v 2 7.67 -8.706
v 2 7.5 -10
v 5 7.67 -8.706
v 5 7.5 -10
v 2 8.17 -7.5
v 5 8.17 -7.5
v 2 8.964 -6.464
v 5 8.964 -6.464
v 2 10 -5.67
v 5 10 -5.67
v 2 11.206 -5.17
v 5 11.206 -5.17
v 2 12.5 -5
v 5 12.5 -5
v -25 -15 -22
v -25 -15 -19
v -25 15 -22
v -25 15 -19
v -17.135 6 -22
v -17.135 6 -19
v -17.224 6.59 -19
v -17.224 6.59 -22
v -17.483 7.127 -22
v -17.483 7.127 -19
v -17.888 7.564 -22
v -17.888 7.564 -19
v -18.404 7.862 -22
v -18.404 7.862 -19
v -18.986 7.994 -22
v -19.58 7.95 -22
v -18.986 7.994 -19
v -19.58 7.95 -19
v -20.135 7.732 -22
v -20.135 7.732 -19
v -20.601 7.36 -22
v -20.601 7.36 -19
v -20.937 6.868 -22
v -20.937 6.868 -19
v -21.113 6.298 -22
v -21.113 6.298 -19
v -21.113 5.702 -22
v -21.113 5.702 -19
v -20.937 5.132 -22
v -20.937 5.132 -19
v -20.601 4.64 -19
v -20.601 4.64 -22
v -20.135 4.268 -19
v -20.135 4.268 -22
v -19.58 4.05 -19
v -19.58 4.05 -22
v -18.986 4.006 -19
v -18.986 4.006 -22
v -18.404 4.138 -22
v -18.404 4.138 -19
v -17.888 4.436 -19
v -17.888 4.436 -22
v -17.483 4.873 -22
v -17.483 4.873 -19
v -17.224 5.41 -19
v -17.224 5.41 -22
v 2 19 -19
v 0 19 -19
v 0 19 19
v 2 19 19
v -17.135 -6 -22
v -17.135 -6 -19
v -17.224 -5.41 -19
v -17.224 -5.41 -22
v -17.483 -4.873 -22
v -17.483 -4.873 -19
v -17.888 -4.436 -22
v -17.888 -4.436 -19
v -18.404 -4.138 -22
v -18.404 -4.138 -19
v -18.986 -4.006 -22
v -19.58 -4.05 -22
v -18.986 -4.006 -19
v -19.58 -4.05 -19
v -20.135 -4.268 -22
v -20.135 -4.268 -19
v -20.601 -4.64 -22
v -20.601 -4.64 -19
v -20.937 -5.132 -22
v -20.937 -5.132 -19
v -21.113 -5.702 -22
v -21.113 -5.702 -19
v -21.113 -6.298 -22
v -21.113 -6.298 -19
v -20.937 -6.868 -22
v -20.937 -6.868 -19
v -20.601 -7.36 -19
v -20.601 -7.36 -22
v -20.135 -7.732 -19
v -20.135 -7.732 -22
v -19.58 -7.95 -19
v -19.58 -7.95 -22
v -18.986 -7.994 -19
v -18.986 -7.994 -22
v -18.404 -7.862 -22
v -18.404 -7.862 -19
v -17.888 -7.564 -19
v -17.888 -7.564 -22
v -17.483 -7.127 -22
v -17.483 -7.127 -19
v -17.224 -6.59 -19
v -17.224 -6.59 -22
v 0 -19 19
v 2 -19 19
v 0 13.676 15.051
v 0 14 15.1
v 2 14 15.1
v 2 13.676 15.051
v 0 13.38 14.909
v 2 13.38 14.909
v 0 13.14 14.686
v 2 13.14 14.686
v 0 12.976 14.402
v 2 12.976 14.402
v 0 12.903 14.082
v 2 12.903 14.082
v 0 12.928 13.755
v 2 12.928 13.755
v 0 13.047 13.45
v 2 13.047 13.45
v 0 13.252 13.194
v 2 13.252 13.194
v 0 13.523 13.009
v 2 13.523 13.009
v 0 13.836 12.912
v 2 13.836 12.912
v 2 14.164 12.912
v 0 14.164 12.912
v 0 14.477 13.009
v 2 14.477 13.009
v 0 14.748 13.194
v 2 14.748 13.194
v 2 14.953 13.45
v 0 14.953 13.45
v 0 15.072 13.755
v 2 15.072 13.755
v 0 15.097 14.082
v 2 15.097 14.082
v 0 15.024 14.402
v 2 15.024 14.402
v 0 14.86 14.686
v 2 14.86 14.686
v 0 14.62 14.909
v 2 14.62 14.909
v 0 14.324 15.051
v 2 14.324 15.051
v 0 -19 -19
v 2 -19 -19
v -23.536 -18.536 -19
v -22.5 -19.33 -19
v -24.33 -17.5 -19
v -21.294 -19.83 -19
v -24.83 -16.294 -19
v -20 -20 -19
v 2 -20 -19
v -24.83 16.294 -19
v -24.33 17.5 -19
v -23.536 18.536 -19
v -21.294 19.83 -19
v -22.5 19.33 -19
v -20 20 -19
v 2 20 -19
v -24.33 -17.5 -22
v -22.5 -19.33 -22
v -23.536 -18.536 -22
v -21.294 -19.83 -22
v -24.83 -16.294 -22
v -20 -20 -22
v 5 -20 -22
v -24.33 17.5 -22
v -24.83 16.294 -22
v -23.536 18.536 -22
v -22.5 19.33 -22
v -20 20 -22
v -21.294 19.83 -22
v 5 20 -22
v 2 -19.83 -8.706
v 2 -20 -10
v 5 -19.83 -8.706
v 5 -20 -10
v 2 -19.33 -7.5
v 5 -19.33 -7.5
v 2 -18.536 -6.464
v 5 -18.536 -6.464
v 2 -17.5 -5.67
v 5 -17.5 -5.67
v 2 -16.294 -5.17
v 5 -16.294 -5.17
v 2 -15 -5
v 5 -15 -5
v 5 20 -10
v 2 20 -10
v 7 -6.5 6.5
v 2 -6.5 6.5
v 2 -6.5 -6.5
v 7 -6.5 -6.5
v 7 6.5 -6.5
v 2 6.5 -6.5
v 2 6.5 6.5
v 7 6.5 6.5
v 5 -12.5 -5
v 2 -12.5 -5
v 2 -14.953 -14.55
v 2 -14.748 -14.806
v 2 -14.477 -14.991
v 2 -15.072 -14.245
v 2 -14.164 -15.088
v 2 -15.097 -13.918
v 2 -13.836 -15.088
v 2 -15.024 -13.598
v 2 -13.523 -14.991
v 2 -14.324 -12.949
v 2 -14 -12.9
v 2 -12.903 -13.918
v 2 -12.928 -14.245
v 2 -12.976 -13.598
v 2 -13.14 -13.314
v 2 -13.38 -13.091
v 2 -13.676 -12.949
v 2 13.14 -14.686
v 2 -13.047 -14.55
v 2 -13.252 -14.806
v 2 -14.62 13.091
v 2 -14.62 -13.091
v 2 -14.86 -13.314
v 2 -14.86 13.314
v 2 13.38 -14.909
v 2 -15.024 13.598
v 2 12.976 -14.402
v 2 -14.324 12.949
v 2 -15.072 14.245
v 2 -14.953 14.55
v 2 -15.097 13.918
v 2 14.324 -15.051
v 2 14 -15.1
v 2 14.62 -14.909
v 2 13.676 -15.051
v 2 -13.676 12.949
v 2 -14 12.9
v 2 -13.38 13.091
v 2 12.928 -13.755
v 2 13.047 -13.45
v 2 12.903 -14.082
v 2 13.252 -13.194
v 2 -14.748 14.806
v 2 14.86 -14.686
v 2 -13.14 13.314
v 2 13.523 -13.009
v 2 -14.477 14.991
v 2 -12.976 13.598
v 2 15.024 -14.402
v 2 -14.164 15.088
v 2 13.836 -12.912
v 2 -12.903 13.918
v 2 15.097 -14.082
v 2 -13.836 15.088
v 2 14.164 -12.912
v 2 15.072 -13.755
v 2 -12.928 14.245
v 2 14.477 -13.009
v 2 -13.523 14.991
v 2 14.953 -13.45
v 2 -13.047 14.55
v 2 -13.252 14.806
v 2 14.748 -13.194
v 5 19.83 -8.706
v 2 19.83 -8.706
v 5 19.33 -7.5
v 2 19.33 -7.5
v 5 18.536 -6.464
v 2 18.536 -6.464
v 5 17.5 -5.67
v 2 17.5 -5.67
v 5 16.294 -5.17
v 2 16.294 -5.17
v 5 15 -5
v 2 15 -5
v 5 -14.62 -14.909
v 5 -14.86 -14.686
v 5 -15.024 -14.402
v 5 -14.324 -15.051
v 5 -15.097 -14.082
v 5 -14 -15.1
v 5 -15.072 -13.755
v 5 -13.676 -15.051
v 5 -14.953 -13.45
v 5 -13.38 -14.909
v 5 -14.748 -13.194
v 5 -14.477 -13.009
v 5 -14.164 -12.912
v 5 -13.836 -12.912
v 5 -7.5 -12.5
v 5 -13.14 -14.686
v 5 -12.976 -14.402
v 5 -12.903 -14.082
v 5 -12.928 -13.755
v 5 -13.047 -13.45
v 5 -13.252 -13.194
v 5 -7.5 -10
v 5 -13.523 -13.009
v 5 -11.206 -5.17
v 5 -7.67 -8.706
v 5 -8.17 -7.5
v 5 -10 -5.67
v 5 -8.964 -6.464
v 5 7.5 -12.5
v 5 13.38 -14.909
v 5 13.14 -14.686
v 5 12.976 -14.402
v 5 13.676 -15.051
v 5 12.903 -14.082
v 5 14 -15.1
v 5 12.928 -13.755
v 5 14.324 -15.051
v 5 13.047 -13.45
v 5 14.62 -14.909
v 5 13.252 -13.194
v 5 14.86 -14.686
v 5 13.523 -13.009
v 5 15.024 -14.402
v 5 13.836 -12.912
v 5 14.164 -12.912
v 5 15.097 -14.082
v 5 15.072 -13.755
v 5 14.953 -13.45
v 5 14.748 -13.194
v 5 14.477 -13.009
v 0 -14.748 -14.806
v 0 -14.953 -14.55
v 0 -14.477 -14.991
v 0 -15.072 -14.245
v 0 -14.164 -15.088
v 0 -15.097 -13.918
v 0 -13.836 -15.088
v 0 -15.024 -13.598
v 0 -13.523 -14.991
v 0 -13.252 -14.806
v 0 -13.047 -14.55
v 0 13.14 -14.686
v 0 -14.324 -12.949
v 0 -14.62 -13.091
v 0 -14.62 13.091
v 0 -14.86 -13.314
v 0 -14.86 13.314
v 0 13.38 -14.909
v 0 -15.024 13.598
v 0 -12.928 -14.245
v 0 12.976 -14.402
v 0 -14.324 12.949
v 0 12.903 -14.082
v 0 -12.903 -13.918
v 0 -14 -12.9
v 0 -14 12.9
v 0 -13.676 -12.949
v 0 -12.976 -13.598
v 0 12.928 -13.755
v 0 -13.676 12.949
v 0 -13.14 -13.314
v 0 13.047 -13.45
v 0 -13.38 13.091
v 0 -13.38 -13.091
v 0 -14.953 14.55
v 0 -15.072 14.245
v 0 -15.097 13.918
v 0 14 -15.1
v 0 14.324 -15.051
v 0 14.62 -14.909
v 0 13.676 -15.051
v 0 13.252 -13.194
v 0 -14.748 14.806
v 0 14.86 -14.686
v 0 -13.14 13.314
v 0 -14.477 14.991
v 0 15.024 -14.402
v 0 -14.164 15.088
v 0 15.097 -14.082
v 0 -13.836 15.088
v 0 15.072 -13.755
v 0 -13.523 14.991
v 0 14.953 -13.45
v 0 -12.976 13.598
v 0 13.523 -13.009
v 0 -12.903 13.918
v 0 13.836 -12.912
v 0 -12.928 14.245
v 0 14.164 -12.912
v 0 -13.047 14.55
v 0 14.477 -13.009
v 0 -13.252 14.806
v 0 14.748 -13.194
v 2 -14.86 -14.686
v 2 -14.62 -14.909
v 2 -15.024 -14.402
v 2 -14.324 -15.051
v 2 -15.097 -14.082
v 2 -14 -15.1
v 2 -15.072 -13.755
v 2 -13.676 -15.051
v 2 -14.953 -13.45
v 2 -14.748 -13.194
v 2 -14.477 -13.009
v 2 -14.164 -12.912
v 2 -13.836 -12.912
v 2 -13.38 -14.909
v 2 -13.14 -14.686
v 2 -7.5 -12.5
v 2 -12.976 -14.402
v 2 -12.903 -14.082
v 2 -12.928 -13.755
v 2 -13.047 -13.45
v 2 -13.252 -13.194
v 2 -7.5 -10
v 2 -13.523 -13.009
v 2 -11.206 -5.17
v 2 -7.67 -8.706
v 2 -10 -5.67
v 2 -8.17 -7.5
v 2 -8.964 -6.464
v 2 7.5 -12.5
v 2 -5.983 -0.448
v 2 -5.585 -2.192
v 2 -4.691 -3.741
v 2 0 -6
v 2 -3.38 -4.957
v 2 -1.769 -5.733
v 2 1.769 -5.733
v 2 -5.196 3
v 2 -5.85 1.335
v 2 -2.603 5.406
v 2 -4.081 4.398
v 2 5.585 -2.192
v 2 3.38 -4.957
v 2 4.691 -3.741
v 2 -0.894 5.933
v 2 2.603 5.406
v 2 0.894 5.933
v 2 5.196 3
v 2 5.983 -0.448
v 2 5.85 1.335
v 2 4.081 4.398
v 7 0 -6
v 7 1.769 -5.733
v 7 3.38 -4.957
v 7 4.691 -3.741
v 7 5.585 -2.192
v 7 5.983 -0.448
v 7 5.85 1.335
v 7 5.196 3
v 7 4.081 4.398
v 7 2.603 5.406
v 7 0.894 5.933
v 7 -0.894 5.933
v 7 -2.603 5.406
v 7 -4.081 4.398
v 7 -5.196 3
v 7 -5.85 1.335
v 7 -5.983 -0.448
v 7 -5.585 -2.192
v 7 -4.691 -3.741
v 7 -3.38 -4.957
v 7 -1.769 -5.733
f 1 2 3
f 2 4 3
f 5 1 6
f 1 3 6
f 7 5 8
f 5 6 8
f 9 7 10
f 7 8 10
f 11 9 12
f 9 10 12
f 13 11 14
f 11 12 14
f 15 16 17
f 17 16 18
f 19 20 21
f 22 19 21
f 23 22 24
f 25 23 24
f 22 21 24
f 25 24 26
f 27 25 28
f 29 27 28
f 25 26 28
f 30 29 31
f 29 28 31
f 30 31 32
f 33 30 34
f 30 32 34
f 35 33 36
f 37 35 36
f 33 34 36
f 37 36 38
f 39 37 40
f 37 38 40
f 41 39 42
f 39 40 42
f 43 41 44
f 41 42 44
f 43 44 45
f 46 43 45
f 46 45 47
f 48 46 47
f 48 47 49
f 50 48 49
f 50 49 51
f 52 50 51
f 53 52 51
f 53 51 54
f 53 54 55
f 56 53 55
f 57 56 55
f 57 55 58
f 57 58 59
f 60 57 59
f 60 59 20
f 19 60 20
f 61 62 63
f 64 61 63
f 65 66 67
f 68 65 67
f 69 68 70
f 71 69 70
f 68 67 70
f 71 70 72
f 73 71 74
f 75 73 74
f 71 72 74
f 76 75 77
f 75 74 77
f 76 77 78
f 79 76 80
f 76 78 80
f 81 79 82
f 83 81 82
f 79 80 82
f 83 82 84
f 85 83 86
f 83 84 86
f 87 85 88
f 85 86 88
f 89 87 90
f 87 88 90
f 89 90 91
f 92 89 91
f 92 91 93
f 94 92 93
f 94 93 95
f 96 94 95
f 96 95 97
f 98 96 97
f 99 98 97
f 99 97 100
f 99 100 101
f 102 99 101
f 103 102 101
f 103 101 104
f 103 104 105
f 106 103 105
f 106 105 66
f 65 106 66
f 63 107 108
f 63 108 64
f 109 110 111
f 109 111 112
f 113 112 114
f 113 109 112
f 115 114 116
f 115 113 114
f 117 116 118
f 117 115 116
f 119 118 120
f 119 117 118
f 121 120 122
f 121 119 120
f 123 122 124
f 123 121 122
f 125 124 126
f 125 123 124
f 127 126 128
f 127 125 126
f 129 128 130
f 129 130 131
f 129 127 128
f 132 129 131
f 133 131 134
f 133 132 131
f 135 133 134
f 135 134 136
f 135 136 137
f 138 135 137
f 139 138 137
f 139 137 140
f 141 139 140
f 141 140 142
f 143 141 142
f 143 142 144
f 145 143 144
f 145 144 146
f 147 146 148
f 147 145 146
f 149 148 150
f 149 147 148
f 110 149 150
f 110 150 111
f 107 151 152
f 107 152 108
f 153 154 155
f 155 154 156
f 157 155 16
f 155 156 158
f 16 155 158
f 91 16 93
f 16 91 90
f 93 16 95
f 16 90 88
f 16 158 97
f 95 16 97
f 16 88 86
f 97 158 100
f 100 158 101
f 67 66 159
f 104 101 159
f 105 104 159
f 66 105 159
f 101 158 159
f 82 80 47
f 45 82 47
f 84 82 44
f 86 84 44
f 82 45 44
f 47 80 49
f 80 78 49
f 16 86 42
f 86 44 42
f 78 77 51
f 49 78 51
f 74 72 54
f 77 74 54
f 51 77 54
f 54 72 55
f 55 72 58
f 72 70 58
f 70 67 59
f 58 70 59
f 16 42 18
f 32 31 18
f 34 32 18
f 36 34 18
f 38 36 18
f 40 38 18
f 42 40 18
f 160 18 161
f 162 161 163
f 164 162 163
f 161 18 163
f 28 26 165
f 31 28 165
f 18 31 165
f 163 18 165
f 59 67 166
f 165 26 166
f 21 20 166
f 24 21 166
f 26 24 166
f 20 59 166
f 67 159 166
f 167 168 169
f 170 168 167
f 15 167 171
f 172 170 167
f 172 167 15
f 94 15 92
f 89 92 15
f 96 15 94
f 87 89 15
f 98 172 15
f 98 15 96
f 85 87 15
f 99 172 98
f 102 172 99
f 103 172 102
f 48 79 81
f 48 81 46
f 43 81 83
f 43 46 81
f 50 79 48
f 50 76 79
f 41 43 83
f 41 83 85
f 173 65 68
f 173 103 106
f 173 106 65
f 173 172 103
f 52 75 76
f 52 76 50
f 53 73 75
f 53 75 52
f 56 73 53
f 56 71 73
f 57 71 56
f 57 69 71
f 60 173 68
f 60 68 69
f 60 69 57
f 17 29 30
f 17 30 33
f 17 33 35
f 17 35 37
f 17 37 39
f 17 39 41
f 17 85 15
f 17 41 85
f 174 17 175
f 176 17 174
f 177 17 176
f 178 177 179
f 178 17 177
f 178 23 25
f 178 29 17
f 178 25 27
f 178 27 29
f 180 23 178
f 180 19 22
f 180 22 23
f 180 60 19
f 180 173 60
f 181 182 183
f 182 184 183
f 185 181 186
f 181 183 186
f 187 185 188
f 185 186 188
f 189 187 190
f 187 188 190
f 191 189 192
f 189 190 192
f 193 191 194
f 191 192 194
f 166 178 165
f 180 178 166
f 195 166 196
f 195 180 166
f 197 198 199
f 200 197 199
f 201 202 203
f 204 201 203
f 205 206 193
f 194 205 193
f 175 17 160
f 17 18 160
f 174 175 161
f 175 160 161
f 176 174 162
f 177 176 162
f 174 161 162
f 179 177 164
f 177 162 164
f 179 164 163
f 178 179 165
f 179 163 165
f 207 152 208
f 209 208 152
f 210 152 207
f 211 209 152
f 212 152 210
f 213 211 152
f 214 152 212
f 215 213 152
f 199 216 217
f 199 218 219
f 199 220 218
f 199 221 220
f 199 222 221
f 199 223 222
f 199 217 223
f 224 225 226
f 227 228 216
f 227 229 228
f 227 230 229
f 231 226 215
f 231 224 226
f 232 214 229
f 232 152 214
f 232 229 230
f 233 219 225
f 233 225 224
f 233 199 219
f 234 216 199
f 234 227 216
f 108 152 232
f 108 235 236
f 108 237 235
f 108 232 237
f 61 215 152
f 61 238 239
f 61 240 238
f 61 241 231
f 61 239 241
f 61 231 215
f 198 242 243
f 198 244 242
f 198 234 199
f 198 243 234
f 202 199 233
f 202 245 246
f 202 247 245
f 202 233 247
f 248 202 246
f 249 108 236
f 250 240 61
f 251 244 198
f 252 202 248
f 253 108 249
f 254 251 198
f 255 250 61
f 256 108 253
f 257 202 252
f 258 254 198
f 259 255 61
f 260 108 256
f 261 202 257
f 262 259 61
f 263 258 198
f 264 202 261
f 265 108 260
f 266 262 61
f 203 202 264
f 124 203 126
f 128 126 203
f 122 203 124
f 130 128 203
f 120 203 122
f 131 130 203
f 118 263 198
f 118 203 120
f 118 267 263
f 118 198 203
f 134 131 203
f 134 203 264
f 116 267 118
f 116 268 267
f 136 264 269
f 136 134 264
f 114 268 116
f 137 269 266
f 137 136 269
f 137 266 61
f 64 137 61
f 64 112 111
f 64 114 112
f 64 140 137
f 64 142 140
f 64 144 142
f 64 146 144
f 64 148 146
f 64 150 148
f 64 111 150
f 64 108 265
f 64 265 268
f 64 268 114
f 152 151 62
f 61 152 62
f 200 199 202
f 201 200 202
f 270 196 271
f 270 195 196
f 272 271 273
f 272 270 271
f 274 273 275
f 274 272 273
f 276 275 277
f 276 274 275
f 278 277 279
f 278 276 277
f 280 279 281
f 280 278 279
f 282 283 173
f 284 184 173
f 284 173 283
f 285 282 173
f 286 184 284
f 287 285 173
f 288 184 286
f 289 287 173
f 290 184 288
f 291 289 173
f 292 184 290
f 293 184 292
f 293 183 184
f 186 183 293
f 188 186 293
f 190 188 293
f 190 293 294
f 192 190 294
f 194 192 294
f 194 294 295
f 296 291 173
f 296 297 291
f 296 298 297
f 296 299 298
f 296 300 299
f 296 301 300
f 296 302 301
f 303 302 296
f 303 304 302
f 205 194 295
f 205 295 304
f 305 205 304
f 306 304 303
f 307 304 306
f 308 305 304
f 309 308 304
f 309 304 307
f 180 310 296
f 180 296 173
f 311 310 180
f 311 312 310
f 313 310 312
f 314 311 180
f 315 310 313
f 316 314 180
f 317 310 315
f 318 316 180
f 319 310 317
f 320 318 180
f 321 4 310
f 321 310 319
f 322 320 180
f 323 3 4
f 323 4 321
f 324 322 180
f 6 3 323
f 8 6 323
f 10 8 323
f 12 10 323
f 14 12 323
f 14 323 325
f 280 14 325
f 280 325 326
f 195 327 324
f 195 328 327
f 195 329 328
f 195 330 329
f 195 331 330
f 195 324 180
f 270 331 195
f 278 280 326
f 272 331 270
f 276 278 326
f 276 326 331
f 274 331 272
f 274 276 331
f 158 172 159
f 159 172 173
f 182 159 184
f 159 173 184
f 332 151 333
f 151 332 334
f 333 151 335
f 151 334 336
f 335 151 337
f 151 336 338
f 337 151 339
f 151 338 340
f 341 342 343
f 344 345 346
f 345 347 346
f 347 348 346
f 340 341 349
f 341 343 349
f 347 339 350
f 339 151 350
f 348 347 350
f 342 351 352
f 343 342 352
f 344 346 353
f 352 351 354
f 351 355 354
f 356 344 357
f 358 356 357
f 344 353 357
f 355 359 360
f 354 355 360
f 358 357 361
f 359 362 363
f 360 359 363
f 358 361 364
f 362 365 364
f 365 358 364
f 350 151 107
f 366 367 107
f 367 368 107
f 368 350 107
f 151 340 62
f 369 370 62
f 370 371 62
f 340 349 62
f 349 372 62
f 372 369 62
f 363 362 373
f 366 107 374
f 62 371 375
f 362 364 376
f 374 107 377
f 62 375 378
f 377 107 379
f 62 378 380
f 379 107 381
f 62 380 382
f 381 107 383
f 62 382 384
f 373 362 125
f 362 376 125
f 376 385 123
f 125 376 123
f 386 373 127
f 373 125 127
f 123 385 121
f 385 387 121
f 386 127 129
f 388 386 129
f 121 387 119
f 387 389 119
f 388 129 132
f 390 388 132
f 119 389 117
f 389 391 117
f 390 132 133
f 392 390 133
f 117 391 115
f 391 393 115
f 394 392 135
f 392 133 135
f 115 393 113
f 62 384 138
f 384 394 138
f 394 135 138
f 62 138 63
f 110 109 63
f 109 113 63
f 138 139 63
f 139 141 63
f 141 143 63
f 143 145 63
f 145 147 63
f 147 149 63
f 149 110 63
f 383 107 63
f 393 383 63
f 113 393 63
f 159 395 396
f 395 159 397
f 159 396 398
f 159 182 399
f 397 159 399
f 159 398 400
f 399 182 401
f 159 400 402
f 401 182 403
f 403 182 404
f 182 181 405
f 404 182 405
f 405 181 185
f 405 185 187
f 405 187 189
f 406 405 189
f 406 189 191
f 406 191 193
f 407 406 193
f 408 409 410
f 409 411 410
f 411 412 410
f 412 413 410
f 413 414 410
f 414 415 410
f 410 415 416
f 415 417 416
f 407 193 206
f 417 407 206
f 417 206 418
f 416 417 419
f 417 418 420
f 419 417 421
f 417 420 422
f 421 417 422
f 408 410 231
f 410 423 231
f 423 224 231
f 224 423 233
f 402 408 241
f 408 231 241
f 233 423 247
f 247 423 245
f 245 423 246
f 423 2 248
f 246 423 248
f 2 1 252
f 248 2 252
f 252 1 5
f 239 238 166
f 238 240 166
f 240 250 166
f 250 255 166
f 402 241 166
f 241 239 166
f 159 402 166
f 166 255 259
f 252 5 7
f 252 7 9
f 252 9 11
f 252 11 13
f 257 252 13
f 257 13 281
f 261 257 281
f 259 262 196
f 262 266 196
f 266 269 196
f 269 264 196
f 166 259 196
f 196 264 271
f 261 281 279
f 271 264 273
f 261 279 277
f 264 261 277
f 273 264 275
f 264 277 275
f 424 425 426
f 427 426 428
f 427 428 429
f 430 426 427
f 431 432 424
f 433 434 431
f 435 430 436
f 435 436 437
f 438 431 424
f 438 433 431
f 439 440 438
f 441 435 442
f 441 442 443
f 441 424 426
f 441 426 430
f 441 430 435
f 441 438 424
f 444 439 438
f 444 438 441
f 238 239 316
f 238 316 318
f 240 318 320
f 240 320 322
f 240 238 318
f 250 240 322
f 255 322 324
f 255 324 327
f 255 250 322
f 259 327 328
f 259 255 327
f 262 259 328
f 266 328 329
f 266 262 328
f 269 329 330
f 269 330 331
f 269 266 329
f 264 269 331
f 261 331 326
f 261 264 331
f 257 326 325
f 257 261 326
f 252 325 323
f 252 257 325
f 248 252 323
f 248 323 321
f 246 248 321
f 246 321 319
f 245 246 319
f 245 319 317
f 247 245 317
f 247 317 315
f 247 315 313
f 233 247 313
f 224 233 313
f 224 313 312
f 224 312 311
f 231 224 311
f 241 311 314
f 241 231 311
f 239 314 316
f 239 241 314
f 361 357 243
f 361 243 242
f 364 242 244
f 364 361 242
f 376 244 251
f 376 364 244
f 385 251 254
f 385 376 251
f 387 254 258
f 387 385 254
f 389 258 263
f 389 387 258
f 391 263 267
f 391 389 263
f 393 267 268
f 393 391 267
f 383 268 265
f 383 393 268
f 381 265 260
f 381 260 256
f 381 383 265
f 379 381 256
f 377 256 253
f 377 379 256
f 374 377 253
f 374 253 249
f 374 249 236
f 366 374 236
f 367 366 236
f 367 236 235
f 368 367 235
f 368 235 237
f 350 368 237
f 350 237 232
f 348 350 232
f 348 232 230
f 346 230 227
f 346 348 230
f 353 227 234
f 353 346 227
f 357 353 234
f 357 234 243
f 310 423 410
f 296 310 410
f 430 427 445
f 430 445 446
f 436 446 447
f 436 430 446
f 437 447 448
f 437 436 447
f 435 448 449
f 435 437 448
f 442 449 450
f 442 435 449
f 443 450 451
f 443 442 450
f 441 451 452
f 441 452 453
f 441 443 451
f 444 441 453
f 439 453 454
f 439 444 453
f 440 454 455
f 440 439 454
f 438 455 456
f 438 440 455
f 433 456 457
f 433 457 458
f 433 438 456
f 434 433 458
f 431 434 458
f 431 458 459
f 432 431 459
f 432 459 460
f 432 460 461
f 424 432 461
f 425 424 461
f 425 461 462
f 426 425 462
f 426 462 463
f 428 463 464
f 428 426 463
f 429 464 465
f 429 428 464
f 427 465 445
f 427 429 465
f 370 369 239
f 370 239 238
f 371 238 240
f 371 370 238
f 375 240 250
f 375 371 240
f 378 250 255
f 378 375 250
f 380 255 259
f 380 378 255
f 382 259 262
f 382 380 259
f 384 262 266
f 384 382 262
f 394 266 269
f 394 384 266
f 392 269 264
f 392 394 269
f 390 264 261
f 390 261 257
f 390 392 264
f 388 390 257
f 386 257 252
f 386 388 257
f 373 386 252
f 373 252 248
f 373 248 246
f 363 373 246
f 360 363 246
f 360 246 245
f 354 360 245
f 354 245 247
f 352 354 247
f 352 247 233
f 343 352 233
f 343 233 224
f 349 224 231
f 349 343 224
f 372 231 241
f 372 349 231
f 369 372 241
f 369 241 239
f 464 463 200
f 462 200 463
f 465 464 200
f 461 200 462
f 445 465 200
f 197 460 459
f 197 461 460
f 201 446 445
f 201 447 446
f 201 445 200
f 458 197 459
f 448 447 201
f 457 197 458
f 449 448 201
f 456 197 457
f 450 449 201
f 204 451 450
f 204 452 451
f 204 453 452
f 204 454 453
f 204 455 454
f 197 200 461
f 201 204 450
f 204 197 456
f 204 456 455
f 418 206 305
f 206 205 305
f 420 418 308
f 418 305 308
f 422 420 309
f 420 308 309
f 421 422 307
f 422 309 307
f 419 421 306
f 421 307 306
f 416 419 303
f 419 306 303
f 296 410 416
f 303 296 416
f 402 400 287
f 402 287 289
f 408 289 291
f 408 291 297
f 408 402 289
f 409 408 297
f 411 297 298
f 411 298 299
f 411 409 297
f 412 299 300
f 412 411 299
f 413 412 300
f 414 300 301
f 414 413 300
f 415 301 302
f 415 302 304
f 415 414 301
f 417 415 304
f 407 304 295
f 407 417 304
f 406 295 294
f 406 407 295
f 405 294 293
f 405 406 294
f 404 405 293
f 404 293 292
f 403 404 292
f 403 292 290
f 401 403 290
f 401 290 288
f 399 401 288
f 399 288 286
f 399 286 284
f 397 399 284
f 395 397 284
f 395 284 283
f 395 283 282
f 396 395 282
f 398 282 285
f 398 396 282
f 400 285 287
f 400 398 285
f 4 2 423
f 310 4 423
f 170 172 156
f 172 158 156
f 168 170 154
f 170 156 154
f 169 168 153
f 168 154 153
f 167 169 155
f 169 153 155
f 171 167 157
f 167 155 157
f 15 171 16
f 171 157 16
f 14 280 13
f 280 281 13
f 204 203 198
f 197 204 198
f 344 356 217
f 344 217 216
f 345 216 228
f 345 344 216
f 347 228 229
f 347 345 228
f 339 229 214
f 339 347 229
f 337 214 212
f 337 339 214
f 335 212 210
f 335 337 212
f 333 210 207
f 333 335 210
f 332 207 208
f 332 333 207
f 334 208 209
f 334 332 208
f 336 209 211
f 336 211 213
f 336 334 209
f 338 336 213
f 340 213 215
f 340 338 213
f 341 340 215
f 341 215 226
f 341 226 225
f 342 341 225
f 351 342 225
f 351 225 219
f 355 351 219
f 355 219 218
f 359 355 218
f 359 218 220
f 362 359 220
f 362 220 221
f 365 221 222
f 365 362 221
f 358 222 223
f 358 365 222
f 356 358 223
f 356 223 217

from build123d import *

# Parameters (mm, degrees)
SKETCH1_W           = 38
SKETCH1_H           = 38
SKETCH1_R           = 1.1
BOSS_EXTRUDE1_DEPTH = 2
SKETCH2_R           = 6.5
SKETCH2_R_2         = 6
BOSS_EXTRUDE2_DEPTH = 5
SKETCH3_R           = 1.1
BOSS_EXTRUDE3_DEPTH = 3
SKETCH4_W           = 40
SKETCH4_H           = 3
BOSS_EXTRUDE4_DEPTH = 30
SKETCH5_R           = 2
CUT_EXTRUDE1_DEPTH  = 10
FILLET1_R           = 5


with BuildPart() as part:
    # Sketch1 → Boss-Extrude1 (new body)
    with BuildSketch(Plane.YZ):
        Rectangle(SKETCH1_W, SKETCH1_H)
        with Locations(Location((-14, 14, 0), (0, 0, 270))):
            Circle(SKETCH1_R, mode=Mode.SUBTRACT)
        with Locations(Location((-14, -14, 0), (0, 0, 90))):
            Circle(SKETCH1_R, mode=Mode.SUBTRACT)
        with Locations(Location((14, -14, 0), (0, 0, 270))):
            Circle(SKETCH1_R, mode=Mode.SUBTRACT)
        with Locations(Location((14, 14, 0), (0, 0, 90))):
            Circle(SKETCH1_R, mode=Mode.SUBTRACT)
    extrude(amount=BOSS_EXTRUDE1_DEPTH)

    # Sketch2 → Boss-Extrude2 (add)
    # profile 1 of 5: a face of its own
    with BuildSketch(Plane.YZ.offset(2)):
        with BuildLine():
            Line((-6.5, 6.5), (-6.5, 8e-09))
            ThreePointArc((-6.5, 8e-09), (-4.596194075, 4.596194081), (0, 6.5))
            Line((0, 6.5), (-6.5, 6.5))
        make_face()
    # profile 2 of 5: a face of its own
    with BuildSketch(Plane.YZ.offset(2)):
        with BuildLine():
            ThreePointArc((0, 6.5), (4.596194078, 4.596194078), (6.5, 0))
            Line((6.5, 0), (6.5, 6.5))
            Line((6.5, 6.5), (0, 6.5))
        make_face()
    # profile 3 of 5: a face of its own
    with BuildSketch(Plane.YZ.offset(2)):
        Circle(SKETCH2_R)
        with Locations(Location((0, 0, 0), (0, 0, 270))):
            Circle(SKETCH2_R_2, mode=Mode.SUBTRACT)
    # profile 4 of 5: a face of its own
    with BuildSketch(Plane.YZ.offset(2)):
        with BuildLine():
            ThreePointArc((6.5, 0), (4.596194078, -4.596194078), (0, -6.5))
            Line((0, -6.5), (6.5, -6.5))
            Line((6.5, -6.5), (6.5, 0))
        make_face()
    # profile 5 of 5: a face of its own
    with BuildSketch(Plane.YZ.offset(2)):
        with BuildLine():
            Line((-6.5, 8e-09), (-6.5, -6.5))
            Line((-6.5, -6.5), (0, -6.5))
            ThreePointArc((0, -6.5), (-4.596194081, -4.596194075), (-6.5, 8e-09))
        make_face()
    extrude(amount=BOSS_EXTRUDE2_DEPTH)


with BuildPart() as body_2:
    # Sketch3 → Boss-Extrude3 (new body)
    # profile 1 of 2: a face of its own
    with BuildSketch(Plane.YZ.offset(2)):
        Polygon((19, -5), (7.5, -5), (7.5, -12.5), (-7.5, -12.5), (-7.5, -5), (-19, -5), (-19, -19), (19, -19), align=None)
        with Locations(Location((-14, -14, 0), (0, 0, 270))):
            Circle(SKETCH3_R, mode=Mode.SUBTRACT)
        with Locations(Location((14, -14, 0), (0, 0, 270))):
            Circle(SKETCH3_R, mode=Mode.SUBTRACT)
    # profile 2 of 2: a face of its own
    with BuildSketch(Plane.YZ.offset(2)):
        Polygon((20, -5), (19, -5), (19, -19), (-19, -19), (-19, -5), (-20, -5), (-20, -22), (20, -22), align=None)
    extrude(amount=BOSS_EXTRUDE3_DEPTH)

    # Sketch4 → Boss-Extrude4 (add)
    with BuildSketch(Plane.YZ.offset(5)):
        with Locations((0, -20.5)):
            Rectangle(SKETCH4_W, SKETCH4_H)
    extrude(amount=-BOSS_EXTRUDE4_DEPTH)

    # Sketch5 → Cut-Extrude1 (cut)
    with BuildSketch(Plane.XY.offset(-19)):
        with Locations((-19.135005254, 6)):
            Circle(SKETCH5_R)
        with Locations((-19.135005254, -6)):
            Circle(SKETCH5_R)
    extrude(amount=-CUT_EXTRUDE1_DEPTH, mode=Mode.SUBTRACT)

    # Fillet1
    fillet1_edges = [body_2.edges().sort_by_distance(p)[0] for p in [
        (3.5, 7.5, -5),
        (3.5, 20, -5),
        (3.5, -20, -5),
        (3.5, -7.5, -5),
        (-25, 20, -20.5),
        (-25, -20, -20.5),
    ]]
    fillet(fillet1_edges, radius=FILLET1_R)


solid = Compound([part.part, body_2.part])
